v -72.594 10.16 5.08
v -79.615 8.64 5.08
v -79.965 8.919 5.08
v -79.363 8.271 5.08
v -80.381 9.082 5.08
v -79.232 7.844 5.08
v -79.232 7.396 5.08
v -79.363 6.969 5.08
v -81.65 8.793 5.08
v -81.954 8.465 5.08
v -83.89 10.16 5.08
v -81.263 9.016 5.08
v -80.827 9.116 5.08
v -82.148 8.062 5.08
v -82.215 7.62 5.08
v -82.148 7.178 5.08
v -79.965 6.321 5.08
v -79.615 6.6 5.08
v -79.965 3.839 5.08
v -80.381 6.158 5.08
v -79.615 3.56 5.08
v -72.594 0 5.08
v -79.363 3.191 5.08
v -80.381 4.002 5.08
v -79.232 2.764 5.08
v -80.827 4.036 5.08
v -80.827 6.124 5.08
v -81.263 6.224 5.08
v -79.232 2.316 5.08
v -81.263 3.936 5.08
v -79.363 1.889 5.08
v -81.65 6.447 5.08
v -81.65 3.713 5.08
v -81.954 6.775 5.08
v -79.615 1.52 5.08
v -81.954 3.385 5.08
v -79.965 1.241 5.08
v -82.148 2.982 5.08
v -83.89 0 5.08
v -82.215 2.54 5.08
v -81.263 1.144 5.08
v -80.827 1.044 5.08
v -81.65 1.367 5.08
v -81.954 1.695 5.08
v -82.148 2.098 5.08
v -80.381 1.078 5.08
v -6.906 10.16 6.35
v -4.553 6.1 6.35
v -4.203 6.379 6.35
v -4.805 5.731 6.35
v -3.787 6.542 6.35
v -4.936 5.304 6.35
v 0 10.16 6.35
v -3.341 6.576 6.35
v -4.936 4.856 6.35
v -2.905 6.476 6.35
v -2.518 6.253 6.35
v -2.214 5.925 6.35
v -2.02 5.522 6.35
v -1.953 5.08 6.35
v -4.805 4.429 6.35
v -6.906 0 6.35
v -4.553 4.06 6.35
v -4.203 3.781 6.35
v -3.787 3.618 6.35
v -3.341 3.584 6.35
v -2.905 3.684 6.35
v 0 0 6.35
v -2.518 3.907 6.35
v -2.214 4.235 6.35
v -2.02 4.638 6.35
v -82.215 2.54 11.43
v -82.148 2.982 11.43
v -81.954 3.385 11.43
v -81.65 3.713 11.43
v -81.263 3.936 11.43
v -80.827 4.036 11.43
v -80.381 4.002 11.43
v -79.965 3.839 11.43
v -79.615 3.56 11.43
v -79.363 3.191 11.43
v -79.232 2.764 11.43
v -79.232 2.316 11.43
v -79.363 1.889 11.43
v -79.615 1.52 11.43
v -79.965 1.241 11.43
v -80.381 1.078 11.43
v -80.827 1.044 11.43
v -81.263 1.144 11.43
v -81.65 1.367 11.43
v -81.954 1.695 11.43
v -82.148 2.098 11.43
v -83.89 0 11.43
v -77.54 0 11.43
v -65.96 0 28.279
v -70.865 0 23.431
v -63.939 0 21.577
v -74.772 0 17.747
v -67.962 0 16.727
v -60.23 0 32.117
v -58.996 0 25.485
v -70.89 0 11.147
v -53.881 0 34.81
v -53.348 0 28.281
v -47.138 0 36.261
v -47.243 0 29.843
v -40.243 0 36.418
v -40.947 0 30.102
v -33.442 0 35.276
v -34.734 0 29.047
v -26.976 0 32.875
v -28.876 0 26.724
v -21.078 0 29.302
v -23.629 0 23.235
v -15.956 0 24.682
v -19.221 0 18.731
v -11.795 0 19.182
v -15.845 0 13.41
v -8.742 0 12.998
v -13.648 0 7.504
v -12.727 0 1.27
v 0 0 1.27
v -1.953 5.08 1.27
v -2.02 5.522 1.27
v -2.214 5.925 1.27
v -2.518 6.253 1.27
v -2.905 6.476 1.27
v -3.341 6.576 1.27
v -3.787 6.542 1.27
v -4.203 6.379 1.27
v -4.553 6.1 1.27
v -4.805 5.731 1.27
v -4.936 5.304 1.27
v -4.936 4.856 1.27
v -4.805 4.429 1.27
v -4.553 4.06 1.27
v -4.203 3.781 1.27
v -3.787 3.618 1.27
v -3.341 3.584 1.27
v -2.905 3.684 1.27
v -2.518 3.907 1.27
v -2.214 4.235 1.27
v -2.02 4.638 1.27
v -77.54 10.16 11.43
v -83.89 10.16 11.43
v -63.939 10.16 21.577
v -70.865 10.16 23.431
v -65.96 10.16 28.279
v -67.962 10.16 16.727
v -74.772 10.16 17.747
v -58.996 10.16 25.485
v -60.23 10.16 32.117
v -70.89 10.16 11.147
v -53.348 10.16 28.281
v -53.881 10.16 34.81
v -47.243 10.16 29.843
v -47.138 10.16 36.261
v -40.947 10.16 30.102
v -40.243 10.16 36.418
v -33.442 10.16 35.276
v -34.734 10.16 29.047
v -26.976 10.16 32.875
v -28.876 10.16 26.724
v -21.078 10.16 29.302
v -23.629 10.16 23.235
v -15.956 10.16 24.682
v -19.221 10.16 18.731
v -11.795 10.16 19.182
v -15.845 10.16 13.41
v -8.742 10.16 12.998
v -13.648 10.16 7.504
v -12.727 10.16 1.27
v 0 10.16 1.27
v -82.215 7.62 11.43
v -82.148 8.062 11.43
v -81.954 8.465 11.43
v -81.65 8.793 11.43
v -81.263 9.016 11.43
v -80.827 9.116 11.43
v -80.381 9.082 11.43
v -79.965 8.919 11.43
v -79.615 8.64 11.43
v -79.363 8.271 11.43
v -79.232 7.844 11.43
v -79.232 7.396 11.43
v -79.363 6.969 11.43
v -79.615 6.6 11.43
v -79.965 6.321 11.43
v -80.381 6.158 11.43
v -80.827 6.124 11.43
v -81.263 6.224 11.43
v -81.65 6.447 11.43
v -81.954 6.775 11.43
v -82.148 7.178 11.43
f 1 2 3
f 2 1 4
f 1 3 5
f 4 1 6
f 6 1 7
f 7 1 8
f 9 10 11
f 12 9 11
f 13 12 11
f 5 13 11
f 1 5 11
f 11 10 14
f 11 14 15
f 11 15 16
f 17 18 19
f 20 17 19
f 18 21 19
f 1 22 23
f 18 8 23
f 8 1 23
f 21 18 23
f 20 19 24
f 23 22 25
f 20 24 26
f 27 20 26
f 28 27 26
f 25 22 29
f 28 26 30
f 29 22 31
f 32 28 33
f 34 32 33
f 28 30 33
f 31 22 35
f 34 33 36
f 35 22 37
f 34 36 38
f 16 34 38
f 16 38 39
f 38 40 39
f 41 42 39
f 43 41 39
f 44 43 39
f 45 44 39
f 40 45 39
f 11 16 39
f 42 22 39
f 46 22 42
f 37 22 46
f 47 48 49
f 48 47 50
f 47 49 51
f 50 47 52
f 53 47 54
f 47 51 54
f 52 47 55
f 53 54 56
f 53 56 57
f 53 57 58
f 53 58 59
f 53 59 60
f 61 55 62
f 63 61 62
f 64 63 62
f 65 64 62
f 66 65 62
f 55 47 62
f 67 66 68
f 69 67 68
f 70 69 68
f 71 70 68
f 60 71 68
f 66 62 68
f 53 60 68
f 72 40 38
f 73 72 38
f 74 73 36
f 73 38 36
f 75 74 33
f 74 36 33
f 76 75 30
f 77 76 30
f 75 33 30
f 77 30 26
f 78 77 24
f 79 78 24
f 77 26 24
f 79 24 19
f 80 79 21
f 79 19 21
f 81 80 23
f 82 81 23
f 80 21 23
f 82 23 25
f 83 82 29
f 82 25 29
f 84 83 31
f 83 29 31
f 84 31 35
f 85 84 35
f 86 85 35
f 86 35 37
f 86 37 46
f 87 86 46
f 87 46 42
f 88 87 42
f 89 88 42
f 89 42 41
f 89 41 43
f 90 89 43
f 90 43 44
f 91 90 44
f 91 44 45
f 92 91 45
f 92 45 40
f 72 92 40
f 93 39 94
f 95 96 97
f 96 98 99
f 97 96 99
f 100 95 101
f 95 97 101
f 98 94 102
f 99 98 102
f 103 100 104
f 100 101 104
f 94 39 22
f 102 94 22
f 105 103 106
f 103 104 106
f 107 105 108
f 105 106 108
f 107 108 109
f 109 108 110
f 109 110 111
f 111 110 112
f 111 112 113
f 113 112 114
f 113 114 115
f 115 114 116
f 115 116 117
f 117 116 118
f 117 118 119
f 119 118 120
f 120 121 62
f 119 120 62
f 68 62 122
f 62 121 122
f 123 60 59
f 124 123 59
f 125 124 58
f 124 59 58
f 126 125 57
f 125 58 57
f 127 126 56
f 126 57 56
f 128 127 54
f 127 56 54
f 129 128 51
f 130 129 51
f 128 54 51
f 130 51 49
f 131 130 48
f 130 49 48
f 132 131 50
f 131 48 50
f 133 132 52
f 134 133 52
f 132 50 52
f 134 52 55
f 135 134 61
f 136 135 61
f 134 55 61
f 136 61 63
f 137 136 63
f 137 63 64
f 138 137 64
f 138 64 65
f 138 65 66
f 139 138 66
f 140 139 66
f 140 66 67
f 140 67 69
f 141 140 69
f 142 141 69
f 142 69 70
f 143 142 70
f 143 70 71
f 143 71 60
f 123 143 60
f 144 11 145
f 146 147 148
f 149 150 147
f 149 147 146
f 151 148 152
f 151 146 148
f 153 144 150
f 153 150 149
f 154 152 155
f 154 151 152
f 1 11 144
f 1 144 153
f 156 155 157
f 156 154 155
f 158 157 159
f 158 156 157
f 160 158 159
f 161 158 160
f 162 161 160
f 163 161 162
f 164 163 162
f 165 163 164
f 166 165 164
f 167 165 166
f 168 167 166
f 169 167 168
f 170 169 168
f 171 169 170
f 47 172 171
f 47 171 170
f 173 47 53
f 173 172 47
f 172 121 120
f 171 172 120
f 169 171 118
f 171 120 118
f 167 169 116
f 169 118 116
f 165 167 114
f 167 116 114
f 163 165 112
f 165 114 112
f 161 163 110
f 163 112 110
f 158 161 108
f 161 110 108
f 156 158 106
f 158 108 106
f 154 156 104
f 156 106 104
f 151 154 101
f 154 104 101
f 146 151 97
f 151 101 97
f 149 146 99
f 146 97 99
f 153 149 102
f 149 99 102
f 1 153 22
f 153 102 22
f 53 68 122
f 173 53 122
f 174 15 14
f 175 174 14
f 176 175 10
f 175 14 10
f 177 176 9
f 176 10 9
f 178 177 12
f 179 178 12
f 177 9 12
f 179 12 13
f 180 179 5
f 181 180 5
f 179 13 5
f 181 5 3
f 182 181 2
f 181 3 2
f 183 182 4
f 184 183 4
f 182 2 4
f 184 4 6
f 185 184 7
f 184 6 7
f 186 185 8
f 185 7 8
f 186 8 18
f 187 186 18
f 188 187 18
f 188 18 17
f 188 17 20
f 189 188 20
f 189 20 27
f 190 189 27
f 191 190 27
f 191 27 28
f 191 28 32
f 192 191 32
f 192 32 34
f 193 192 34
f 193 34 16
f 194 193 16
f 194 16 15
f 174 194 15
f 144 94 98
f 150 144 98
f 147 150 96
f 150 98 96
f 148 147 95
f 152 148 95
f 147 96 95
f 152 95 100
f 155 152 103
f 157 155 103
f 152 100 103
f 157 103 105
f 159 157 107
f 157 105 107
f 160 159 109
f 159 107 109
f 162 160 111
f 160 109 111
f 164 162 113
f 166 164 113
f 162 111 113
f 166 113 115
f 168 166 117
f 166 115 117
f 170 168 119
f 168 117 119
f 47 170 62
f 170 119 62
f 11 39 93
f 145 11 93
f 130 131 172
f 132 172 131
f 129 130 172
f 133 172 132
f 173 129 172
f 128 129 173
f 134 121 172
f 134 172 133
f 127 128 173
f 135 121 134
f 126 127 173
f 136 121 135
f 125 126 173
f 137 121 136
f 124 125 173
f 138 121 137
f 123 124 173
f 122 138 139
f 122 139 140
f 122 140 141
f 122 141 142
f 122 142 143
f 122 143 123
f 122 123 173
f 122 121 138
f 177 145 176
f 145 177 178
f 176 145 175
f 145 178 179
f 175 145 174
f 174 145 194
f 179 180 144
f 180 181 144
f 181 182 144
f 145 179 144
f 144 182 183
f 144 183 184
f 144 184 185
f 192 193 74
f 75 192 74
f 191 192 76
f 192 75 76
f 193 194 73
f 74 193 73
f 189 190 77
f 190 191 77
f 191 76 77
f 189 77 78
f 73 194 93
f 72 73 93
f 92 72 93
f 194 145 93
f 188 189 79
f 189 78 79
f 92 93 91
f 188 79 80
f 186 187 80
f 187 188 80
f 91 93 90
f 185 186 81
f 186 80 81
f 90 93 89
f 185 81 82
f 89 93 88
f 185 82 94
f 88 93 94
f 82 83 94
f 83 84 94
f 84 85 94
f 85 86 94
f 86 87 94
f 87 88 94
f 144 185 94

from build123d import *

# Parameters (mm, degrees)
BOSS_EXTRUDE1_DEPTH = 10.16
SKETCH2_R           = 1.5
CUT_EXTRUDE1_DEPTH  = 32.4325
SKETCH3_R           = 1.5
CUT_EXTRUDE2_DEPTH  = 7.35
SKETCH4_W           = 12.726748703
SKETCH4_H           = 1.27
CUT_EXTRUDE3_DEPTH  = 11.16


with BuildPart() as part:
    # Sketch1 → Boss-Extrude1 (new body)
    with BuildSketch(Plane(origin=(0, 0, 0), x_dir=(1, 0, 0), z_dir=(0, 1, 0))):
        with BuildLine():
            Line((0, 0), (-12.7, 0))
            ThreePointArc((-12.7, 0), (-40.313380236, -30.054590243), (-72.594133091, -5.08))
            Line((-72.594133091, -5.08), (-83.889837791, -5.08))
            Line((-83.889837791, -5.08), (-83.889837791, -11.43))
            Line((-83.889837791, -11.43), (-77.539837791, -11.43))
            ThreePointArc((-77.539837791, -11.43), (-40.243263553, -36.418432925), (-6.906413502, -6.35))
            Line((-6.906413502, -6.35), (0, -6.35))
            Line((0, -6.35), (0, 0))
        make_face()
    extrude(amount=BOSS_EXTRUDE1_DEPTH)

    # Sketch2 → Cut-Extrude1 (cut, through all)
    with BuildSketch(Plane(origin=(0, 0, 5.08), x_dir=(-1, 0, 0), z_dir=(0, 0, -1))):
        with Locations((80.714837791, 7.62)):
            Circle(SKETCH2_R)
        with Locations((80.714837791, 2.54)):
            Circle(SKETCH2_R)
    extrude(amount=-CUT_EXTRUDE1_DEPTH, mode=Mode.SUBTRACT)

    # Sketch3 → Cut-Extrude2 (cut, through all)
    with BuildSketch(Plane.XY.offset(6.35)):
        with Locations((-3.453206751, 5.08)):
            Circle(SKETCH3_R)
    extrude(amount=-CUT_EXTRUDE2_DEPTH, mode=Mode.SUBTRACT)

    # Sketch4 → Cut-Extrude3 (cut, through all)
    with BuildSketch(Plane.XZ):
        with Locations((-6.363374352, 0.635)):
            Rectangle(SKETCH4_W, SKETCH4_H)
    extrude(amount=-CUT_EXTRUDE3_DEPTH, mode=Mode.SUBTRACT)


solid = part.part
